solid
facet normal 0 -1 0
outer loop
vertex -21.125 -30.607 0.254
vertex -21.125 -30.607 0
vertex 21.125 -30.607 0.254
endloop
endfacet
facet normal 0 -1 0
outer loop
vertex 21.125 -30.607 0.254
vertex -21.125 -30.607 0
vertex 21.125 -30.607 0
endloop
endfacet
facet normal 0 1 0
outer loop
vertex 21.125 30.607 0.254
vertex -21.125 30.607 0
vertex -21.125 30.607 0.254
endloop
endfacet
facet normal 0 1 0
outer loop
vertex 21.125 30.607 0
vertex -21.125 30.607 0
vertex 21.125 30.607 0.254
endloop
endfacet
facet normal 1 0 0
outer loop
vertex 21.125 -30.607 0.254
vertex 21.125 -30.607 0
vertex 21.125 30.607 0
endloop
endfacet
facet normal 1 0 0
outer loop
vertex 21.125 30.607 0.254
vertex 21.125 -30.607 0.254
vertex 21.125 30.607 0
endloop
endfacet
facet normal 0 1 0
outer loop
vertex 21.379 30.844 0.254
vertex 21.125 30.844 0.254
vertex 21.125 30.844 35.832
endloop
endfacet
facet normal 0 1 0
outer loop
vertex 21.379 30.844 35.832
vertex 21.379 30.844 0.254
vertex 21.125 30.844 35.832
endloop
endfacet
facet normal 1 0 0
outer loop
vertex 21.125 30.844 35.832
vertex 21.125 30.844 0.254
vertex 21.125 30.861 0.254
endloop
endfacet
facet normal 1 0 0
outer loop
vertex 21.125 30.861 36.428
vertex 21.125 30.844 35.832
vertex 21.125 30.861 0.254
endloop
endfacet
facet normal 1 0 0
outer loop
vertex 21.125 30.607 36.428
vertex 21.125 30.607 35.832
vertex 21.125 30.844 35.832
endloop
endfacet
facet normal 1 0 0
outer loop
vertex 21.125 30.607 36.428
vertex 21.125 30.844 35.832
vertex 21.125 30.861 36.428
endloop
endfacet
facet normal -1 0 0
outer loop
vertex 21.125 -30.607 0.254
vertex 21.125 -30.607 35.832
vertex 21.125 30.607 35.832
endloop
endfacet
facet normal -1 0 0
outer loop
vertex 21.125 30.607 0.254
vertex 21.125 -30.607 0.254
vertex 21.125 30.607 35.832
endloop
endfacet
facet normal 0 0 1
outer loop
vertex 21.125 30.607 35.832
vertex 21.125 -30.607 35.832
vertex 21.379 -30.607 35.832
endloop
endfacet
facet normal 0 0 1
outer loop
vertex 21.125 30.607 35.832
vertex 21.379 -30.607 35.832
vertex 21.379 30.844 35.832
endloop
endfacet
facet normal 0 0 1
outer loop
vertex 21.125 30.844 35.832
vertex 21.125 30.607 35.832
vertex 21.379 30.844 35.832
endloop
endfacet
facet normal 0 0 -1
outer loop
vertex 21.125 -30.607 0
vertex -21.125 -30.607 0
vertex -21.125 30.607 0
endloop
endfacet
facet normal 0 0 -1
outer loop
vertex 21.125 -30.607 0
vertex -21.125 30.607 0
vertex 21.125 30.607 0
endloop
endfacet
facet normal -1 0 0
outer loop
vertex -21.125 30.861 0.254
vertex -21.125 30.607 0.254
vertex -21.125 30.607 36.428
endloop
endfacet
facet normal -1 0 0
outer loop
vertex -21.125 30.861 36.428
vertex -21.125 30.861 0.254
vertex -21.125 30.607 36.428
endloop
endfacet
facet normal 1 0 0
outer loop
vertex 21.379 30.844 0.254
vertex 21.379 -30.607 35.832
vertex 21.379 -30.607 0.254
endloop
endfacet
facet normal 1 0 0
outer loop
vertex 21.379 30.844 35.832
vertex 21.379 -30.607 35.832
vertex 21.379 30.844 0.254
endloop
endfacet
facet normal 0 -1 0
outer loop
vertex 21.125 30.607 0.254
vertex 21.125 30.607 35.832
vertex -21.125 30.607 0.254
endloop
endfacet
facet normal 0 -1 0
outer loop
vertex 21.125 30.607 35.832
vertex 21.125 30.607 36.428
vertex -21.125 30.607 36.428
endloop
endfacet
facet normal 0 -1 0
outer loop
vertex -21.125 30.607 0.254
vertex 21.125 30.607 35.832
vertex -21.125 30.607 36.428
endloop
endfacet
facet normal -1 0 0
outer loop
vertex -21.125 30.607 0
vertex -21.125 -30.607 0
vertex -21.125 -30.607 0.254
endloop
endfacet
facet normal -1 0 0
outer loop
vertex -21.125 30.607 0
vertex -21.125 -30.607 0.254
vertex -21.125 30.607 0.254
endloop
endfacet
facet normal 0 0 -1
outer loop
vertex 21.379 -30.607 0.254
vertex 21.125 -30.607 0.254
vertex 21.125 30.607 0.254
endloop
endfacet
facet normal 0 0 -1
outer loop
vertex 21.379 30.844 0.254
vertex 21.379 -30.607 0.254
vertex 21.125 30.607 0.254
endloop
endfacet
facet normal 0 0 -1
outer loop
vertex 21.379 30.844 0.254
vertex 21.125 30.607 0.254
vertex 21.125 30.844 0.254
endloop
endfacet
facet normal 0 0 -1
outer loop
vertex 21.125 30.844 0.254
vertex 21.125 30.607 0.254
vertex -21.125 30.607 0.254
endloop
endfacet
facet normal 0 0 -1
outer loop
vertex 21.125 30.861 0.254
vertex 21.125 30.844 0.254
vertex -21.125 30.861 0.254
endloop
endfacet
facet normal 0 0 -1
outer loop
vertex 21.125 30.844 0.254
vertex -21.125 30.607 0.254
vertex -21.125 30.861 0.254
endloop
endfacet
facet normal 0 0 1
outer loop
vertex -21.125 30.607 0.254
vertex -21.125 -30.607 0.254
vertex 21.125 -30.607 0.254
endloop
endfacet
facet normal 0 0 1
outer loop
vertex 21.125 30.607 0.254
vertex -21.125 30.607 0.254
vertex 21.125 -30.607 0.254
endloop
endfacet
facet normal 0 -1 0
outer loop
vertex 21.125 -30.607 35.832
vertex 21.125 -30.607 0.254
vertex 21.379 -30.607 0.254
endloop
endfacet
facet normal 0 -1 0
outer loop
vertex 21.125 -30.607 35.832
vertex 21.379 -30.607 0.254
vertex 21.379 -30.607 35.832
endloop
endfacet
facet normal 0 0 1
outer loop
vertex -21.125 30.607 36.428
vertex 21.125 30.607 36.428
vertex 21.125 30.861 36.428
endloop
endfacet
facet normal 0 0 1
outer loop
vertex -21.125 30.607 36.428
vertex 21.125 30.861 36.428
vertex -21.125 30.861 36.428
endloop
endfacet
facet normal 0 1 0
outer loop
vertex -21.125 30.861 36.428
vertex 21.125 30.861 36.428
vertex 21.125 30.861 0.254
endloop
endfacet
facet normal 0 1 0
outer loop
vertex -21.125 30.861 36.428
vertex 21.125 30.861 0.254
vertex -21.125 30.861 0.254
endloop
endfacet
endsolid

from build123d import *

# Parameters (mm, degrees)
F0_W     = 42.2506034374
F0_H     = 61.2134709954
F1_DEPTH = 0.254
F2_W     = 42.2506034374
F2_H     = 36.1739821515
F3_DEPTH = 0.254
F4_W     = 61.4502783865
F4_H     = 35.5782709799
F5_DEPTH = 0.254


with BuildPart() as f1:
    # F0 (on Top) → F1 (new body)
    with BuildSketch(Plane.XY):
        Rectangle(F0_W, F0_H)
    extrude(amount=F1_DEPTH)



with BuildPart() as f3:
    # F2 (on face) → F3 (new body)
    with BuildSketch(Plane(origin=(0, 30.6067354977, 0), x_dir=(-1, 0, 0), z_dir=(0, 1, 0))):
        with Locations((0, 18.3409910758)):
            Rectangle(F2_W, F2_H)
    extrude(amount=F3_DEPTH)


with BuildPart() as f1_1:
    add(f1.part)

    add(f3.part)  # F5 merges F3
    # F4 (on face) → F5 (join)
    with BuildSketch(Plane.YZ.offset(21.1253017187)):
        with Locations((0.1184036955, 18.0431354899)):
            Rectangle(F4_W, F4_H)
    extrude(amount=F5_DEPTH)


solid = f1_1.part
